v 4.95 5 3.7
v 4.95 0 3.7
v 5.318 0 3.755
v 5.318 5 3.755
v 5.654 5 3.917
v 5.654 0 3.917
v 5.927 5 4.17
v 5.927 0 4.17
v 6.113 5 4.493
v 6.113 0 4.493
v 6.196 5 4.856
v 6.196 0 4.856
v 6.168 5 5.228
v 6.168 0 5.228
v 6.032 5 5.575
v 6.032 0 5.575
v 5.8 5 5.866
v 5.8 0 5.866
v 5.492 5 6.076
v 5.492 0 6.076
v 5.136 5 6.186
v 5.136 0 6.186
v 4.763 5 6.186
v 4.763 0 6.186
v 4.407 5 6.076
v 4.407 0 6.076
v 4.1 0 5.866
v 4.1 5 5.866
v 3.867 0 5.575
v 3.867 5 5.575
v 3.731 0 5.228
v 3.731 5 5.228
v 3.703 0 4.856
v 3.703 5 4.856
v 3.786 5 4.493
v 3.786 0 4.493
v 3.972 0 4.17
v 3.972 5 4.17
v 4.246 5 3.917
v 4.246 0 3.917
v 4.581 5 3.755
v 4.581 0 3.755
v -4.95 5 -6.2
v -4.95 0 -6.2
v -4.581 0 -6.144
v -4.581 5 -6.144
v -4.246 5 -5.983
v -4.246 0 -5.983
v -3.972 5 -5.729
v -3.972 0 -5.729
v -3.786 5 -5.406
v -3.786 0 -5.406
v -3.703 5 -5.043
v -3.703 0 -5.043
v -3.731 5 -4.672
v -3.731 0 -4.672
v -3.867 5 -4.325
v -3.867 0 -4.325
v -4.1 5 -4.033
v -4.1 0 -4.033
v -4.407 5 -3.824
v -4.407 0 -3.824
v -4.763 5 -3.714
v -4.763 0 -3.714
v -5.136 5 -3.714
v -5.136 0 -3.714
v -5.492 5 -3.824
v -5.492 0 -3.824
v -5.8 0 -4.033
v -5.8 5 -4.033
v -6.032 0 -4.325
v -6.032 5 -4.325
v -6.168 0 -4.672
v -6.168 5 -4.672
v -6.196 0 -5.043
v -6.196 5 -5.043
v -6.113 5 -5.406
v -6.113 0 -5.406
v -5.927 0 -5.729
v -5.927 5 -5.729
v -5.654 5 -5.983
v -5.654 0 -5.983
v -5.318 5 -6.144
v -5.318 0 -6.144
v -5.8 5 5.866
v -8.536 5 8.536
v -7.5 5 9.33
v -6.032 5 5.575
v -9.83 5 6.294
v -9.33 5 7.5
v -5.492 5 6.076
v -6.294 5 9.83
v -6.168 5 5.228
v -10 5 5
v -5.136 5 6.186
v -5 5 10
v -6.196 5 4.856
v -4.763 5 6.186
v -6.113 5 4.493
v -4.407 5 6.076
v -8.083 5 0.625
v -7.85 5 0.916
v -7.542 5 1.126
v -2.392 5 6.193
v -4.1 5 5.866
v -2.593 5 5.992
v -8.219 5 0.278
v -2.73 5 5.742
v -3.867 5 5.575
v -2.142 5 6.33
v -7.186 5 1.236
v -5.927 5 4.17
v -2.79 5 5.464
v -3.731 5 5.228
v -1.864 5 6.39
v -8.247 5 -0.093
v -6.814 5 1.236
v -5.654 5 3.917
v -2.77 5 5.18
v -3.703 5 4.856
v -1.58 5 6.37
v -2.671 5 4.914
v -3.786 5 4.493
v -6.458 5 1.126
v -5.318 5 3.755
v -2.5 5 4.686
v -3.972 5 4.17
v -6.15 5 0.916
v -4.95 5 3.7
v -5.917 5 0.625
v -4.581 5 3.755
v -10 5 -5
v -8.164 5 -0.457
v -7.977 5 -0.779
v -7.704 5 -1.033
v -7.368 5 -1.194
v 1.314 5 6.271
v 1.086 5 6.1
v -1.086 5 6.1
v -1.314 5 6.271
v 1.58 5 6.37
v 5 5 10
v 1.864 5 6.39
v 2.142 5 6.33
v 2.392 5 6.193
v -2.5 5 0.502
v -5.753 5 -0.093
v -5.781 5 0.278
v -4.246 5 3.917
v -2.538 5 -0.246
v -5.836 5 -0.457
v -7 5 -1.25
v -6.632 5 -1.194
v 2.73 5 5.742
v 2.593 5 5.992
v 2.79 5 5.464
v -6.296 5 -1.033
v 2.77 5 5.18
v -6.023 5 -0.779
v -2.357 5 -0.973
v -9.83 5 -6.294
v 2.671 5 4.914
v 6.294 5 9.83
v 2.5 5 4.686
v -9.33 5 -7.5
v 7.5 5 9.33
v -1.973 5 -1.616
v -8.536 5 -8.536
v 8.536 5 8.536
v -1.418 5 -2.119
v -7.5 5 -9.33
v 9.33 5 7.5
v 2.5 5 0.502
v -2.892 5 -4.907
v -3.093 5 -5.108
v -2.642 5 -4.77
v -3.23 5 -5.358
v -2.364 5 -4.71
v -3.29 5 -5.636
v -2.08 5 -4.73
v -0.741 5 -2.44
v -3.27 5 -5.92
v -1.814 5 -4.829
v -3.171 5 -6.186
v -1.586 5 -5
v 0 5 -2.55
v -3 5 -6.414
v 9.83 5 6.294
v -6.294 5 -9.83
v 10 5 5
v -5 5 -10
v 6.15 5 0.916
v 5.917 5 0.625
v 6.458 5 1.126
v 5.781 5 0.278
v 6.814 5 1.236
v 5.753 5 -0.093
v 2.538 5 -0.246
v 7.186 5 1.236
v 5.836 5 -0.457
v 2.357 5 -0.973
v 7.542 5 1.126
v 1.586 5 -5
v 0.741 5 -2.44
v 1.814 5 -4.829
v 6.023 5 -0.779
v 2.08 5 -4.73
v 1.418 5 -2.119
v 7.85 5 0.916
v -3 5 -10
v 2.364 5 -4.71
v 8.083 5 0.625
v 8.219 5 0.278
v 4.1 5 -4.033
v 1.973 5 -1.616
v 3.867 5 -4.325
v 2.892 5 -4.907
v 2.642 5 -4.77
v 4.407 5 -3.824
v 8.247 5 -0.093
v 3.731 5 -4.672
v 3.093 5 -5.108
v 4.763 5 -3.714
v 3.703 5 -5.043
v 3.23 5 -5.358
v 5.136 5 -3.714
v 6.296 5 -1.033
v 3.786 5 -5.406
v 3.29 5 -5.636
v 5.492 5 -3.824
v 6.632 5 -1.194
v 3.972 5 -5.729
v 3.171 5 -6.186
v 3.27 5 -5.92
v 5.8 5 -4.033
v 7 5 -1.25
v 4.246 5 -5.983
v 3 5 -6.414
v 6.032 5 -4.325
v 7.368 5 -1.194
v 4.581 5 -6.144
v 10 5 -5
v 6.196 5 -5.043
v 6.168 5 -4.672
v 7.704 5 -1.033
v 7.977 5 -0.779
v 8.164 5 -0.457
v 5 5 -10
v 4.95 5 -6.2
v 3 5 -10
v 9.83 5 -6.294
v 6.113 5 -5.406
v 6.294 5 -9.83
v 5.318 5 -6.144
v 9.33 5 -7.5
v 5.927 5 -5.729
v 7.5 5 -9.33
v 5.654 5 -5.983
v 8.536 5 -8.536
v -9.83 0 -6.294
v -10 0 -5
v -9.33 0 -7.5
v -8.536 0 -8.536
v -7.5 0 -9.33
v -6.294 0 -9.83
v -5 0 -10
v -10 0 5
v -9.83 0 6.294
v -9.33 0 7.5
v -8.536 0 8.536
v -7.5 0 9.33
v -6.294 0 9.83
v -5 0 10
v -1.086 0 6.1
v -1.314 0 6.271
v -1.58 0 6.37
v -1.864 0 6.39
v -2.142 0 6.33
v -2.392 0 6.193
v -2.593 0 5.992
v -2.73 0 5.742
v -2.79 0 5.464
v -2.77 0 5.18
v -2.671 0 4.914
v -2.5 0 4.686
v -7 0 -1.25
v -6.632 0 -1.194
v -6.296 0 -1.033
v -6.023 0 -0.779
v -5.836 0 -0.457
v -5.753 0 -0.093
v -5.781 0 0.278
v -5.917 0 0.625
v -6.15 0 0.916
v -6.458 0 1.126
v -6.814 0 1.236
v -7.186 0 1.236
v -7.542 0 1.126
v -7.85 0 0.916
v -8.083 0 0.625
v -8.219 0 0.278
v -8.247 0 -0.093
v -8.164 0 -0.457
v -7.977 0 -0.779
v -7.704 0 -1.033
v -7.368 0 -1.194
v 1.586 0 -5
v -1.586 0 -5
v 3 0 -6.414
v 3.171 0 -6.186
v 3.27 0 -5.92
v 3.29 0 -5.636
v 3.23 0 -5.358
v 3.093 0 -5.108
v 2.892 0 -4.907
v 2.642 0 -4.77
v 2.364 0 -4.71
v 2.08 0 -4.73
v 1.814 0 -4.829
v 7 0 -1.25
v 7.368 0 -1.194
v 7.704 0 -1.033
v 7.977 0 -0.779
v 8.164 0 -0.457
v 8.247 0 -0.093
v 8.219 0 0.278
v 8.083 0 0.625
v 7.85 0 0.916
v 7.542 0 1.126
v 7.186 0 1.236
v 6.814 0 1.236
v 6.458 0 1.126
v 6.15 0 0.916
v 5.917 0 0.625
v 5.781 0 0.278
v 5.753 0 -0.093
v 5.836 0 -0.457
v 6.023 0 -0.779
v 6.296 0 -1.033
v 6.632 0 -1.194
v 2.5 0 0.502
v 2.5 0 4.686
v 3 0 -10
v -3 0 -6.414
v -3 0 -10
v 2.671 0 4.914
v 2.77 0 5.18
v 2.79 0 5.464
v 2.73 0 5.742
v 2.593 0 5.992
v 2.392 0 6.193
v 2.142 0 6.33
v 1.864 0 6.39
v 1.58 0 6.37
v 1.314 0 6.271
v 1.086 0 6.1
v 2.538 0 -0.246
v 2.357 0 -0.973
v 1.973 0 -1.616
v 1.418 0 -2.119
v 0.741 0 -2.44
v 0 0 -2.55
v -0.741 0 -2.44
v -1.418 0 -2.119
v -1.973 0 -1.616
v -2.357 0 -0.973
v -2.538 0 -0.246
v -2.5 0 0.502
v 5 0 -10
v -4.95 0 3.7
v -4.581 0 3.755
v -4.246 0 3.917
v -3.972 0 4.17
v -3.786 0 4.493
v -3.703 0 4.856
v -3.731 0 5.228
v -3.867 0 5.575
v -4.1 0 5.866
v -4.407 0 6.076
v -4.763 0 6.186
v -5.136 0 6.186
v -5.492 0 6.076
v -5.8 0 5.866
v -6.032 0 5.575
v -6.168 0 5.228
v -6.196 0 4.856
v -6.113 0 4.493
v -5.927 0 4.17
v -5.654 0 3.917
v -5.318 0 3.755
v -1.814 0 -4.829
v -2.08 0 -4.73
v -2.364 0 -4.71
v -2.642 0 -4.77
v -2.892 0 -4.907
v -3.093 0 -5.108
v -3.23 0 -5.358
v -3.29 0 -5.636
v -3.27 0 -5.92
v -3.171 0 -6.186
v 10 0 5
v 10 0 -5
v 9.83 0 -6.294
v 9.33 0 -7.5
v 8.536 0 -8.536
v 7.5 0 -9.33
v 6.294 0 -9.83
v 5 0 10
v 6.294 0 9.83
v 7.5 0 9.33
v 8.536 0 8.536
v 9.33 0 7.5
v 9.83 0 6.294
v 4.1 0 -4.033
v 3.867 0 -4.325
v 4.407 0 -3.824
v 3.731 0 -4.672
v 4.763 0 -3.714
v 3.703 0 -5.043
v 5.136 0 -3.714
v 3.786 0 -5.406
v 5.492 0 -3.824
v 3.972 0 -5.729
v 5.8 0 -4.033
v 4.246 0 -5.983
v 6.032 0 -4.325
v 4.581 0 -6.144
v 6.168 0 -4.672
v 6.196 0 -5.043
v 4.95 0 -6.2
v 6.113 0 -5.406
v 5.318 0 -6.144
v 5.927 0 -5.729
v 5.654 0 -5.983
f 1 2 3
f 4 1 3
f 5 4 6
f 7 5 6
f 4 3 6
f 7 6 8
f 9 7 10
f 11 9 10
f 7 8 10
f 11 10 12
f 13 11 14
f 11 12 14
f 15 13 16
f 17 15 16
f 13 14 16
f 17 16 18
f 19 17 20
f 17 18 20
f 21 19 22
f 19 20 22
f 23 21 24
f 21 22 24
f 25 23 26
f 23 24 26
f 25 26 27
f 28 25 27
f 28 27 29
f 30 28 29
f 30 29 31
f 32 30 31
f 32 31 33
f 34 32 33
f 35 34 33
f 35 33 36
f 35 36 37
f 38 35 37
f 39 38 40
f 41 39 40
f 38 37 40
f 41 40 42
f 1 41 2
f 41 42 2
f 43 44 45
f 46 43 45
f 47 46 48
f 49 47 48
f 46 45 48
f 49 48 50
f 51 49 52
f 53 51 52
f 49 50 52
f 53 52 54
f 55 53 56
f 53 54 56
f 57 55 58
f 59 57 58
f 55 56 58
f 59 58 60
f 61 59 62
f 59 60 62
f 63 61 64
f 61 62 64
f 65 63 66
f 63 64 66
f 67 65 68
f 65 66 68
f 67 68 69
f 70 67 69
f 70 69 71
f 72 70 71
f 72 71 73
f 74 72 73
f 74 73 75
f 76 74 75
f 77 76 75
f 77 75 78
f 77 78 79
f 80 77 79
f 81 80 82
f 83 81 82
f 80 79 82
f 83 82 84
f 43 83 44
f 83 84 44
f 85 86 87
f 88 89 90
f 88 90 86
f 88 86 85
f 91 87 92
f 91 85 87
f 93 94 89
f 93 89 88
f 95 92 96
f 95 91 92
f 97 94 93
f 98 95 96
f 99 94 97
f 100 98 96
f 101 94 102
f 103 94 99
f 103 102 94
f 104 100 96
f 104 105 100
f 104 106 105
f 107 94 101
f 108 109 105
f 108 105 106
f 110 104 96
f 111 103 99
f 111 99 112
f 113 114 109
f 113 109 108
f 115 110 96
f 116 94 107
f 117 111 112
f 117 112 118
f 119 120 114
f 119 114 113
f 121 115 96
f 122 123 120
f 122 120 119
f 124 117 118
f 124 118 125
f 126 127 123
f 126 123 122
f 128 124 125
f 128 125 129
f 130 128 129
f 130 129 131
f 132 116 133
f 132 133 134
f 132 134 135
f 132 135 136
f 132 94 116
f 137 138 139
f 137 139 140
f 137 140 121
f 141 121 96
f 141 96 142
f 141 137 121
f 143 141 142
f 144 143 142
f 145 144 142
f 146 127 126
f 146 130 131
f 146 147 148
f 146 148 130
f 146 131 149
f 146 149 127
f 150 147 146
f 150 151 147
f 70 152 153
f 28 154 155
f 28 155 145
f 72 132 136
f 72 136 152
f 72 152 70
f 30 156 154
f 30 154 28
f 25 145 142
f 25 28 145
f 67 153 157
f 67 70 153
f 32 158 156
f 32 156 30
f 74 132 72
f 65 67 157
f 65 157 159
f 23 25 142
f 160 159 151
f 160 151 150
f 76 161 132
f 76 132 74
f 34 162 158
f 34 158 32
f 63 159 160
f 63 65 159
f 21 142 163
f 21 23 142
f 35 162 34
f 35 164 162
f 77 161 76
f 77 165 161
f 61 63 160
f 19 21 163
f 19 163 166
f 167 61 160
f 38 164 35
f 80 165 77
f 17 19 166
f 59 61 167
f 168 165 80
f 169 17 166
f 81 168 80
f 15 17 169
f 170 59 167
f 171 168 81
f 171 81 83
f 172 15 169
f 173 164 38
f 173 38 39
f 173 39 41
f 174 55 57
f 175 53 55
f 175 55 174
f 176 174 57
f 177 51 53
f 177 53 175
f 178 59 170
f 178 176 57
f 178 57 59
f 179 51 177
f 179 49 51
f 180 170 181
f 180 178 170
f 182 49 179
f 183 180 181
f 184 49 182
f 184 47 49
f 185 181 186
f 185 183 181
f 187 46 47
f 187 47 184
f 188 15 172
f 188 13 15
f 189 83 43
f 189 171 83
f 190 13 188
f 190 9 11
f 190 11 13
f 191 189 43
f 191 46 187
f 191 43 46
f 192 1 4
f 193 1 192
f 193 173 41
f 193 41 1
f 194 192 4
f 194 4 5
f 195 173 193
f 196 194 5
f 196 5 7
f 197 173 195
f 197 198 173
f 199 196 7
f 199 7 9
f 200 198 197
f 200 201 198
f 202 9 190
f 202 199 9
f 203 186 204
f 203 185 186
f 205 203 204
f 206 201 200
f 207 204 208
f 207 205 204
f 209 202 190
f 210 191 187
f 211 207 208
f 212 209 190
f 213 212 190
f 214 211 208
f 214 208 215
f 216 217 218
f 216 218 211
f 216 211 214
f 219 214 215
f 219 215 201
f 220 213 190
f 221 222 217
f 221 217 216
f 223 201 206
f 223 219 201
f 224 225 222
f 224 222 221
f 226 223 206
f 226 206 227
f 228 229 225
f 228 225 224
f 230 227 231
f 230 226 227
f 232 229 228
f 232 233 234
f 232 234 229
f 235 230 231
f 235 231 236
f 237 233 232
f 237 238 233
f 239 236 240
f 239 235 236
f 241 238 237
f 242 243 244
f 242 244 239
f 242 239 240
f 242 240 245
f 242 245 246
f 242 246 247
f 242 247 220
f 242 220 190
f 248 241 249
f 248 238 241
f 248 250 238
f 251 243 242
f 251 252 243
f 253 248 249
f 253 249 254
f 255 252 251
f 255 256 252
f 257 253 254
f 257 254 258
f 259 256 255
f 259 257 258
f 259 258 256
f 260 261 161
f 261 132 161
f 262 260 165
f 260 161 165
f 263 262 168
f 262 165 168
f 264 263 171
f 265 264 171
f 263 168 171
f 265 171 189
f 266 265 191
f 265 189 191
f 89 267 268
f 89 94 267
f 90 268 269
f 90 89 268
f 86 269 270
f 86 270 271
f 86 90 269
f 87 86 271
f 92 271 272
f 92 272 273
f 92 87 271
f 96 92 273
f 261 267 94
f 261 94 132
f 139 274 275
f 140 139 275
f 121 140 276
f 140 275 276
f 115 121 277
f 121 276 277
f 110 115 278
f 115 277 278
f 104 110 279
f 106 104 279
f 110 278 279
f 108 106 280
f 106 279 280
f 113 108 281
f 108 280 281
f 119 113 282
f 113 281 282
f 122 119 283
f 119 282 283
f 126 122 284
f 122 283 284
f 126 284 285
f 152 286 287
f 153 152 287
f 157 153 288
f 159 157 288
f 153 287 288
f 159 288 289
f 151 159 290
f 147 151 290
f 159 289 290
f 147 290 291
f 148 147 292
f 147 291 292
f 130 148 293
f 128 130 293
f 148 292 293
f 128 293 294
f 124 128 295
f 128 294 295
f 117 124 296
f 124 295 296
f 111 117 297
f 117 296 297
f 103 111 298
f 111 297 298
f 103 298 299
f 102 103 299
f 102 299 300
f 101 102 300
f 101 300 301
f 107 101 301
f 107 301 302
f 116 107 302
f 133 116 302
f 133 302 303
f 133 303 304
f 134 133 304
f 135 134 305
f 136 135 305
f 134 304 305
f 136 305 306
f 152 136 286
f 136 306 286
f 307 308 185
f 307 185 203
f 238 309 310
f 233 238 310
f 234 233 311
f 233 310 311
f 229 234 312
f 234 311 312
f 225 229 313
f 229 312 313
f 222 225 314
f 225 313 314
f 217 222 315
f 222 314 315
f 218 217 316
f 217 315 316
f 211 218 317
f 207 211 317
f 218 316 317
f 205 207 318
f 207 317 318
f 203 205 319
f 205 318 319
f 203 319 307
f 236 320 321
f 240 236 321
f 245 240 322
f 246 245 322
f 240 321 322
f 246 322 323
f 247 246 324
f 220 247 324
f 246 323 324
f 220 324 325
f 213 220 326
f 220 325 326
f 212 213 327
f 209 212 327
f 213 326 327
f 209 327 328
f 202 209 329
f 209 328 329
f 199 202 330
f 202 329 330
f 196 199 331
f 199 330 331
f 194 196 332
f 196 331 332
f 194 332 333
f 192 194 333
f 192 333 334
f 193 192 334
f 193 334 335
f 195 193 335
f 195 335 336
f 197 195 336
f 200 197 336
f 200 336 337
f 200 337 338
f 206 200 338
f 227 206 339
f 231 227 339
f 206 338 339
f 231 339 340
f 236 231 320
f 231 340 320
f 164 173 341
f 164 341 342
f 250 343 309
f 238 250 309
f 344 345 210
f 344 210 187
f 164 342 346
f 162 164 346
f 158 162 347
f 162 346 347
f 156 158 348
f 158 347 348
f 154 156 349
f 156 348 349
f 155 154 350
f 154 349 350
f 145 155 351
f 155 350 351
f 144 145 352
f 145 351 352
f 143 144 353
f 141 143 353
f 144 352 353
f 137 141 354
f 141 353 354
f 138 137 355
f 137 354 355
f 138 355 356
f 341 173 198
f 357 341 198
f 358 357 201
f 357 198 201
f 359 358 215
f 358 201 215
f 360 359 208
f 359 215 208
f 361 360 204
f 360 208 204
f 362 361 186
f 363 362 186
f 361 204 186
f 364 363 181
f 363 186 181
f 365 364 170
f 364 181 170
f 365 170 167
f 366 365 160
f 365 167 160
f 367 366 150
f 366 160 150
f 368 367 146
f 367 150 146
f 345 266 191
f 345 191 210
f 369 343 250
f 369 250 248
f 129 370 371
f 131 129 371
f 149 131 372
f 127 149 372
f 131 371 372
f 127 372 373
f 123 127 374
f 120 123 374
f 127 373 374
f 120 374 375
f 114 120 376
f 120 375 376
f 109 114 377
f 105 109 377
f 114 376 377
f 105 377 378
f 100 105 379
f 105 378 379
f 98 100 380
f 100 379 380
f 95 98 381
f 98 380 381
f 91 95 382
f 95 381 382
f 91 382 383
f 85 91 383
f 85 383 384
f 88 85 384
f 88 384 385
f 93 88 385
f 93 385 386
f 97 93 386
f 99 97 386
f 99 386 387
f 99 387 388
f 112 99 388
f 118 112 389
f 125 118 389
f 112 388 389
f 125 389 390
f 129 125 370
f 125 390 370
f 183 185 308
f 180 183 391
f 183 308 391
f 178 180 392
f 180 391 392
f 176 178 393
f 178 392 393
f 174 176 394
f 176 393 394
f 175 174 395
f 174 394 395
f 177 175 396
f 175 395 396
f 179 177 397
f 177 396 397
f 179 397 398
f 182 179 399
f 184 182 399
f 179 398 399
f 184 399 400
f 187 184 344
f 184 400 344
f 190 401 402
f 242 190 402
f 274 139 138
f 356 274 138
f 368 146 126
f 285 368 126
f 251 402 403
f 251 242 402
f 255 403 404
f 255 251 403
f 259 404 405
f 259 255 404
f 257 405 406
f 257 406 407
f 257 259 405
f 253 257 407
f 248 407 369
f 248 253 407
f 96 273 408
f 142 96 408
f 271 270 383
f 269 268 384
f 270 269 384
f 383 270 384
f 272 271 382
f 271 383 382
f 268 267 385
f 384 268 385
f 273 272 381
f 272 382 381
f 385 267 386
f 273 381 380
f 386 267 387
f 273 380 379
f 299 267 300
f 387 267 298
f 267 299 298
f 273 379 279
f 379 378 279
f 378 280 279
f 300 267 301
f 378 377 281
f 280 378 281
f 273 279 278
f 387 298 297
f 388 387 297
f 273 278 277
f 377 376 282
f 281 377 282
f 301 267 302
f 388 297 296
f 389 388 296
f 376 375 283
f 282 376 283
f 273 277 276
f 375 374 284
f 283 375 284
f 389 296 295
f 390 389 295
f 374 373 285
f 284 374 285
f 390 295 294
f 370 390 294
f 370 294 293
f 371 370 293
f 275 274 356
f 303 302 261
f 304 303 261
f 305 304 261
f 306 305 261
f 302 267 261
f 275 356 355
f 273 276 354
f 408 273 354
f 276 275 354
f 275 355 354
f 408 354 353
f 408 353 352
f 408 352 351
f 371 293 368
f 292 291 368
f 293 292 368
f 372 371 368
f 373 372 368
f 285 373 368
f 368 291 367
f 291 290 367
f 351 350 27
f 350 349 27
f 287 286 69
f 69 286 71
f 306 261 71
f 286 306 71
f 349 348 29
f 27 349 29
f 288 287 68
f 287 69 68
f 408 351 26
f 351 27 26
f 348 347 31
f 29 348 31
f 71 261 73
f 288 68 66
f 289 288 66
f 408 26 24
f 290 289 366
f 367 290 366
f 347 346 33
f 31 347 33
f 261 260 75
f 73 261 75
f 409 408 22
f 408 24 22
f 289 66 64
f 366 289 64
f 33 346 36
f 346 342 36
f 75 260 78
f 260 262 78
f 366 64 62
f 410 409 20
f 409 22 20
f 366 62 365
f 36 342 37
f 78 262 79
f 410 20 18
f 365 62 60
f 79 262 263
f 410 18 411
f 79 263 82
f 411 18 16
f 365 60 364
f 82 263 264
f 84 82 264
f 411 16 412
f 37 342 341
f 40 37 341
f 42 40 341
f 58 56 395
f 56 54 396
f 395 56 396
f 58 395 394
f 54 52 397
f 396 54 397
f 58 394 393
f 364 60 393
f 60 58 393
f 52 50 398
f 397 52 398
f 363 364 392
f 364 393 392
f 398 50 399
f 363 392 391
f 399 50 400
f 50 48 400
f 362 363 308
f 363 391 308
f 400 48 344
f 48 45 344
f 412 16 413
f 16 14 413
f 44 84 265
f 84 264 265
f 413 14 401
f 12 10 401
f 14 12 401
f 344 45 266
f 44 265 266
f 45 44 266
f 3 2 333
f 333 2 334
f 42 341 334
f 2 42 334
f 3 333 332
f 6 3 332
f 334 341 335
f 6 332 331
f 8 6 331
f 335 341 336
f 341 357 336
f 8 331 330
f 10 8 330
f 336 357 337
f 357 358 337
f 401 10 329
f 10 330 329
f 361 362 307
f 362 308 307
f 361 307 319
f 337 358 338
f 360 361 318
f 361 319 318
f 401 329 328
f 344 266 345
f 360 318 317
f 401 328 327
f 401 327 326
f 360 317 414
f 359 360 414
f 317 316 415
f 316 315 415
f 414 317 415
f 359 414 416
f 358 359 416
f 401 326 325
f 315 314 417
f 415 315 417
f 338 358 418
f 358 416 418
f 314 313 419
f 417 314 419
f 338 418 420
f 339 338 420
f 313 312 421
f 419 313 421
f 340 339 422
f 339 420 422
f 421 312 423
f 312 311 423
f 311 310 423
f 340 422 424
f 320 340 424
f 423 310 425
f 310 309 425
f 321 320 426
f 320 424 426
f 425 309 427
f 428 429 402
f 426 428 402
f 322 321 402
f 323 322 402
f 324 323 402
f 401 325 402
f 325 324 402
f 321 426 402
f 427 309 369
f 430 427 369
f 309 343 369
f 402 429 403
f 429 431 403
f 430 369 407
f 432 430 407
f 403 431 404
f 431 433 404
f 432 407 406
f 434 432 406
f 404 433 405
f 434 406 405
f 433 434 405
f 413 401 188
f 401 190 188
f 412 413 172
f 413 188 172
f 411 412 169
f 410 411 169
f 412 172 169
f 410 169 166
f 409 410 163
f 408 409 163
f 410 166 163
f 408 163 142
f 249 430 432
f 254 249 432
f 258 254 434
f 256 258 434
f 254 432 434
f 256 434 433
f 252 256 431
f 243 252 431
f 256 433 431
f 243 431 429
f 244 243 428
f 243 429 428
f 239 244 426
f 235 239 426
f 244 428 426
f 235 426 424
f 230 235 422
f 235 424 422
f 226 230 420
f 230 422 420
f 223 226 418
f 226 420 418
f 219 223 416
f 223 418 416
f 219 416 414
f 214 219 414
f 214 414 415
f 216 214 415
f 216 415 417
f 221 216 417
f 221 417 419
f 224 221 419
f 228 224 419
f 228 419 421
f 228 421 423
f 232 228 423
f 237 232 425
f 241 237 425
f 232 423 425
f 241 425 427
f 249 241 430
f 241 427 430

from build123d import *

# Parameters (mm, degrees)
SKETCH_1_W          = 20
SKETCH_1_H          = 20
EXTRUDE_1_DEPTH     = 5
SKETCH_2_R          = 2.55
CUT_EXTRUDE_1_DEPTH = 5
SKETCH_3_W          = 5
SKETCH_3_H          = 6.1
CUT_EXTRUDE_2_DEPTH = 5
SKETCH_5_R          = 1
CUT_EXTRUDE_4_DEPTH = 10
FILLET_1_R          = 5
SKETCH_6_W          = 6
SKETCH_6_H          = 5
CUT_EXTRUDE_5_DEPTH = 10
SKETCH_7_R          = 1
CUT_EXTRUDE_6_DEPTH = 10
SKETCH_8_R          = 1.25
CUT_EXTRUDE_7_DEPTH = 5


with BuildPart() as part:
    # 스케치1 → 보스-돌출1 (new body)
    with BuildSketch(Plane(origin=(0, 0, 0), x_dir=(1, 0, 0), z_dir=(0, 1, 0))):
        Rectangle(SKETCH_1_W, SKETCH_1_H)
    extrude(amount=EXTRUDE_1_DEPTH)

    # 스케치2 → 컷-돌출1 (cut)
    with BuildSketch(Plane(origin=(0, 5, 0), x_dir=(1, 0, 0), z_dir=(0, 1, 0))):
        with Locations(Location((0, 0, 0), (0, 0, 270))):
            Circle(SKETCH_2_R)
    extrude(amount=-CUT_EXTRUDE_1_DEPTH, mode=Mode.SUBTRACT)

    # 스케치3 → 컷-돌출2 (cut)
    with BuildSketch(Plane.XZ):
        with Locations((0, 3.05)):
            Rectangle(SKETCH_3_W, SKETCH_3_H)
    extrude(amount=-CUT_EXTRUDE_2_DEPTH, mode=Mode.SUBTRACT)

    # 스케치5 → 컷-돌출4 (cut)
    with BuildSketch(Plane(origin=(0, 0, 0), x_dir=(-1, 0, 0), z_dir=(0, -1, 0))):
        with Locations((-1.792893219, -5.392893219)):
            Circle(SKETCH_5_R)
        with Locations((1.792893219, -5.392893219)):
            Circle(SKETCH_5_R)
    extrude(amount=-CUT_EXTRUDE_4_DEPTH, mode=Mode.SUBTRACT)

    # 필렛1
    fillet_1_edges = [part.edges().sort_by_distance(p)[0] for p in [
        (10, 2.5, 10),
        (-10, 2.5, 10),
        (-10, 2.5, -10),
        (10, 2.5, -10),
    ]]
    fillet(fillet_1_edges, radius=FILLET_1_R)

    # 스케치6 → 컷-돌출5 (cut)
    with BuildSketch(Plane.XZ):
        with Locations((0, -7.5)):
            Rectangle(SKETCH_6_W, SKETCH_6_H)
    extrude(amount=-CUT_EXTRUDE_5_DEPTH, mode=Mode.SUBTRACT)

    # 스케치7 → 컷-돌출6 (cut)
    with BuildSketch(Plane(origin=(0, 0, 0), x_dir=(-1, 0, 0), z_dir=(0, -1, 0))):
        with Locations((-2.292893219, 5.707106781)):
            Circle(SKETCH_7_R)
        with Locations((2.292893219, 5.707106781)):
            Circle(SKETCH_7_R)
    extrude(amount=-CUT_EXTRUDE_6_DEPTH, mode=Mode.SUBTRACT)

    # 스케치8 → 컷-돌출7 (cut)
    with BuildSketch(Plane.XZ):
        with Locations(Location((4.949747468, 4.949747468, 0), (0, 0, 270))):
            Circle(SKETCH_8_R)
        with Locations(Location((7, 0, 0), (0, 0, 270))):
            Circle(SKETCH_8_R)
        with Locations(Location((4.949747468, -4.949747468, 0), (0, 0, 270))):
            Circle(SKETCH_8_R)
        with Locations(Location((-4.949747468, -4.949747468, 0), (0, 0, 270))):
            Circle(SKETCH_8_R)
        with Locations(Location((-7, 0, 0), (0, 0, 270))):
            Circle(SKETCH_8_R)
        with Locations(Location((-4.949747468, 4.949747468, 0), (0, 0, 270))):
            Circle(SKETCH_8_R)
    extrude(amount=-CUT_EXTRUDE_7_DEPTH, mode=Mode.SUBTRACT)


solid = part.part
